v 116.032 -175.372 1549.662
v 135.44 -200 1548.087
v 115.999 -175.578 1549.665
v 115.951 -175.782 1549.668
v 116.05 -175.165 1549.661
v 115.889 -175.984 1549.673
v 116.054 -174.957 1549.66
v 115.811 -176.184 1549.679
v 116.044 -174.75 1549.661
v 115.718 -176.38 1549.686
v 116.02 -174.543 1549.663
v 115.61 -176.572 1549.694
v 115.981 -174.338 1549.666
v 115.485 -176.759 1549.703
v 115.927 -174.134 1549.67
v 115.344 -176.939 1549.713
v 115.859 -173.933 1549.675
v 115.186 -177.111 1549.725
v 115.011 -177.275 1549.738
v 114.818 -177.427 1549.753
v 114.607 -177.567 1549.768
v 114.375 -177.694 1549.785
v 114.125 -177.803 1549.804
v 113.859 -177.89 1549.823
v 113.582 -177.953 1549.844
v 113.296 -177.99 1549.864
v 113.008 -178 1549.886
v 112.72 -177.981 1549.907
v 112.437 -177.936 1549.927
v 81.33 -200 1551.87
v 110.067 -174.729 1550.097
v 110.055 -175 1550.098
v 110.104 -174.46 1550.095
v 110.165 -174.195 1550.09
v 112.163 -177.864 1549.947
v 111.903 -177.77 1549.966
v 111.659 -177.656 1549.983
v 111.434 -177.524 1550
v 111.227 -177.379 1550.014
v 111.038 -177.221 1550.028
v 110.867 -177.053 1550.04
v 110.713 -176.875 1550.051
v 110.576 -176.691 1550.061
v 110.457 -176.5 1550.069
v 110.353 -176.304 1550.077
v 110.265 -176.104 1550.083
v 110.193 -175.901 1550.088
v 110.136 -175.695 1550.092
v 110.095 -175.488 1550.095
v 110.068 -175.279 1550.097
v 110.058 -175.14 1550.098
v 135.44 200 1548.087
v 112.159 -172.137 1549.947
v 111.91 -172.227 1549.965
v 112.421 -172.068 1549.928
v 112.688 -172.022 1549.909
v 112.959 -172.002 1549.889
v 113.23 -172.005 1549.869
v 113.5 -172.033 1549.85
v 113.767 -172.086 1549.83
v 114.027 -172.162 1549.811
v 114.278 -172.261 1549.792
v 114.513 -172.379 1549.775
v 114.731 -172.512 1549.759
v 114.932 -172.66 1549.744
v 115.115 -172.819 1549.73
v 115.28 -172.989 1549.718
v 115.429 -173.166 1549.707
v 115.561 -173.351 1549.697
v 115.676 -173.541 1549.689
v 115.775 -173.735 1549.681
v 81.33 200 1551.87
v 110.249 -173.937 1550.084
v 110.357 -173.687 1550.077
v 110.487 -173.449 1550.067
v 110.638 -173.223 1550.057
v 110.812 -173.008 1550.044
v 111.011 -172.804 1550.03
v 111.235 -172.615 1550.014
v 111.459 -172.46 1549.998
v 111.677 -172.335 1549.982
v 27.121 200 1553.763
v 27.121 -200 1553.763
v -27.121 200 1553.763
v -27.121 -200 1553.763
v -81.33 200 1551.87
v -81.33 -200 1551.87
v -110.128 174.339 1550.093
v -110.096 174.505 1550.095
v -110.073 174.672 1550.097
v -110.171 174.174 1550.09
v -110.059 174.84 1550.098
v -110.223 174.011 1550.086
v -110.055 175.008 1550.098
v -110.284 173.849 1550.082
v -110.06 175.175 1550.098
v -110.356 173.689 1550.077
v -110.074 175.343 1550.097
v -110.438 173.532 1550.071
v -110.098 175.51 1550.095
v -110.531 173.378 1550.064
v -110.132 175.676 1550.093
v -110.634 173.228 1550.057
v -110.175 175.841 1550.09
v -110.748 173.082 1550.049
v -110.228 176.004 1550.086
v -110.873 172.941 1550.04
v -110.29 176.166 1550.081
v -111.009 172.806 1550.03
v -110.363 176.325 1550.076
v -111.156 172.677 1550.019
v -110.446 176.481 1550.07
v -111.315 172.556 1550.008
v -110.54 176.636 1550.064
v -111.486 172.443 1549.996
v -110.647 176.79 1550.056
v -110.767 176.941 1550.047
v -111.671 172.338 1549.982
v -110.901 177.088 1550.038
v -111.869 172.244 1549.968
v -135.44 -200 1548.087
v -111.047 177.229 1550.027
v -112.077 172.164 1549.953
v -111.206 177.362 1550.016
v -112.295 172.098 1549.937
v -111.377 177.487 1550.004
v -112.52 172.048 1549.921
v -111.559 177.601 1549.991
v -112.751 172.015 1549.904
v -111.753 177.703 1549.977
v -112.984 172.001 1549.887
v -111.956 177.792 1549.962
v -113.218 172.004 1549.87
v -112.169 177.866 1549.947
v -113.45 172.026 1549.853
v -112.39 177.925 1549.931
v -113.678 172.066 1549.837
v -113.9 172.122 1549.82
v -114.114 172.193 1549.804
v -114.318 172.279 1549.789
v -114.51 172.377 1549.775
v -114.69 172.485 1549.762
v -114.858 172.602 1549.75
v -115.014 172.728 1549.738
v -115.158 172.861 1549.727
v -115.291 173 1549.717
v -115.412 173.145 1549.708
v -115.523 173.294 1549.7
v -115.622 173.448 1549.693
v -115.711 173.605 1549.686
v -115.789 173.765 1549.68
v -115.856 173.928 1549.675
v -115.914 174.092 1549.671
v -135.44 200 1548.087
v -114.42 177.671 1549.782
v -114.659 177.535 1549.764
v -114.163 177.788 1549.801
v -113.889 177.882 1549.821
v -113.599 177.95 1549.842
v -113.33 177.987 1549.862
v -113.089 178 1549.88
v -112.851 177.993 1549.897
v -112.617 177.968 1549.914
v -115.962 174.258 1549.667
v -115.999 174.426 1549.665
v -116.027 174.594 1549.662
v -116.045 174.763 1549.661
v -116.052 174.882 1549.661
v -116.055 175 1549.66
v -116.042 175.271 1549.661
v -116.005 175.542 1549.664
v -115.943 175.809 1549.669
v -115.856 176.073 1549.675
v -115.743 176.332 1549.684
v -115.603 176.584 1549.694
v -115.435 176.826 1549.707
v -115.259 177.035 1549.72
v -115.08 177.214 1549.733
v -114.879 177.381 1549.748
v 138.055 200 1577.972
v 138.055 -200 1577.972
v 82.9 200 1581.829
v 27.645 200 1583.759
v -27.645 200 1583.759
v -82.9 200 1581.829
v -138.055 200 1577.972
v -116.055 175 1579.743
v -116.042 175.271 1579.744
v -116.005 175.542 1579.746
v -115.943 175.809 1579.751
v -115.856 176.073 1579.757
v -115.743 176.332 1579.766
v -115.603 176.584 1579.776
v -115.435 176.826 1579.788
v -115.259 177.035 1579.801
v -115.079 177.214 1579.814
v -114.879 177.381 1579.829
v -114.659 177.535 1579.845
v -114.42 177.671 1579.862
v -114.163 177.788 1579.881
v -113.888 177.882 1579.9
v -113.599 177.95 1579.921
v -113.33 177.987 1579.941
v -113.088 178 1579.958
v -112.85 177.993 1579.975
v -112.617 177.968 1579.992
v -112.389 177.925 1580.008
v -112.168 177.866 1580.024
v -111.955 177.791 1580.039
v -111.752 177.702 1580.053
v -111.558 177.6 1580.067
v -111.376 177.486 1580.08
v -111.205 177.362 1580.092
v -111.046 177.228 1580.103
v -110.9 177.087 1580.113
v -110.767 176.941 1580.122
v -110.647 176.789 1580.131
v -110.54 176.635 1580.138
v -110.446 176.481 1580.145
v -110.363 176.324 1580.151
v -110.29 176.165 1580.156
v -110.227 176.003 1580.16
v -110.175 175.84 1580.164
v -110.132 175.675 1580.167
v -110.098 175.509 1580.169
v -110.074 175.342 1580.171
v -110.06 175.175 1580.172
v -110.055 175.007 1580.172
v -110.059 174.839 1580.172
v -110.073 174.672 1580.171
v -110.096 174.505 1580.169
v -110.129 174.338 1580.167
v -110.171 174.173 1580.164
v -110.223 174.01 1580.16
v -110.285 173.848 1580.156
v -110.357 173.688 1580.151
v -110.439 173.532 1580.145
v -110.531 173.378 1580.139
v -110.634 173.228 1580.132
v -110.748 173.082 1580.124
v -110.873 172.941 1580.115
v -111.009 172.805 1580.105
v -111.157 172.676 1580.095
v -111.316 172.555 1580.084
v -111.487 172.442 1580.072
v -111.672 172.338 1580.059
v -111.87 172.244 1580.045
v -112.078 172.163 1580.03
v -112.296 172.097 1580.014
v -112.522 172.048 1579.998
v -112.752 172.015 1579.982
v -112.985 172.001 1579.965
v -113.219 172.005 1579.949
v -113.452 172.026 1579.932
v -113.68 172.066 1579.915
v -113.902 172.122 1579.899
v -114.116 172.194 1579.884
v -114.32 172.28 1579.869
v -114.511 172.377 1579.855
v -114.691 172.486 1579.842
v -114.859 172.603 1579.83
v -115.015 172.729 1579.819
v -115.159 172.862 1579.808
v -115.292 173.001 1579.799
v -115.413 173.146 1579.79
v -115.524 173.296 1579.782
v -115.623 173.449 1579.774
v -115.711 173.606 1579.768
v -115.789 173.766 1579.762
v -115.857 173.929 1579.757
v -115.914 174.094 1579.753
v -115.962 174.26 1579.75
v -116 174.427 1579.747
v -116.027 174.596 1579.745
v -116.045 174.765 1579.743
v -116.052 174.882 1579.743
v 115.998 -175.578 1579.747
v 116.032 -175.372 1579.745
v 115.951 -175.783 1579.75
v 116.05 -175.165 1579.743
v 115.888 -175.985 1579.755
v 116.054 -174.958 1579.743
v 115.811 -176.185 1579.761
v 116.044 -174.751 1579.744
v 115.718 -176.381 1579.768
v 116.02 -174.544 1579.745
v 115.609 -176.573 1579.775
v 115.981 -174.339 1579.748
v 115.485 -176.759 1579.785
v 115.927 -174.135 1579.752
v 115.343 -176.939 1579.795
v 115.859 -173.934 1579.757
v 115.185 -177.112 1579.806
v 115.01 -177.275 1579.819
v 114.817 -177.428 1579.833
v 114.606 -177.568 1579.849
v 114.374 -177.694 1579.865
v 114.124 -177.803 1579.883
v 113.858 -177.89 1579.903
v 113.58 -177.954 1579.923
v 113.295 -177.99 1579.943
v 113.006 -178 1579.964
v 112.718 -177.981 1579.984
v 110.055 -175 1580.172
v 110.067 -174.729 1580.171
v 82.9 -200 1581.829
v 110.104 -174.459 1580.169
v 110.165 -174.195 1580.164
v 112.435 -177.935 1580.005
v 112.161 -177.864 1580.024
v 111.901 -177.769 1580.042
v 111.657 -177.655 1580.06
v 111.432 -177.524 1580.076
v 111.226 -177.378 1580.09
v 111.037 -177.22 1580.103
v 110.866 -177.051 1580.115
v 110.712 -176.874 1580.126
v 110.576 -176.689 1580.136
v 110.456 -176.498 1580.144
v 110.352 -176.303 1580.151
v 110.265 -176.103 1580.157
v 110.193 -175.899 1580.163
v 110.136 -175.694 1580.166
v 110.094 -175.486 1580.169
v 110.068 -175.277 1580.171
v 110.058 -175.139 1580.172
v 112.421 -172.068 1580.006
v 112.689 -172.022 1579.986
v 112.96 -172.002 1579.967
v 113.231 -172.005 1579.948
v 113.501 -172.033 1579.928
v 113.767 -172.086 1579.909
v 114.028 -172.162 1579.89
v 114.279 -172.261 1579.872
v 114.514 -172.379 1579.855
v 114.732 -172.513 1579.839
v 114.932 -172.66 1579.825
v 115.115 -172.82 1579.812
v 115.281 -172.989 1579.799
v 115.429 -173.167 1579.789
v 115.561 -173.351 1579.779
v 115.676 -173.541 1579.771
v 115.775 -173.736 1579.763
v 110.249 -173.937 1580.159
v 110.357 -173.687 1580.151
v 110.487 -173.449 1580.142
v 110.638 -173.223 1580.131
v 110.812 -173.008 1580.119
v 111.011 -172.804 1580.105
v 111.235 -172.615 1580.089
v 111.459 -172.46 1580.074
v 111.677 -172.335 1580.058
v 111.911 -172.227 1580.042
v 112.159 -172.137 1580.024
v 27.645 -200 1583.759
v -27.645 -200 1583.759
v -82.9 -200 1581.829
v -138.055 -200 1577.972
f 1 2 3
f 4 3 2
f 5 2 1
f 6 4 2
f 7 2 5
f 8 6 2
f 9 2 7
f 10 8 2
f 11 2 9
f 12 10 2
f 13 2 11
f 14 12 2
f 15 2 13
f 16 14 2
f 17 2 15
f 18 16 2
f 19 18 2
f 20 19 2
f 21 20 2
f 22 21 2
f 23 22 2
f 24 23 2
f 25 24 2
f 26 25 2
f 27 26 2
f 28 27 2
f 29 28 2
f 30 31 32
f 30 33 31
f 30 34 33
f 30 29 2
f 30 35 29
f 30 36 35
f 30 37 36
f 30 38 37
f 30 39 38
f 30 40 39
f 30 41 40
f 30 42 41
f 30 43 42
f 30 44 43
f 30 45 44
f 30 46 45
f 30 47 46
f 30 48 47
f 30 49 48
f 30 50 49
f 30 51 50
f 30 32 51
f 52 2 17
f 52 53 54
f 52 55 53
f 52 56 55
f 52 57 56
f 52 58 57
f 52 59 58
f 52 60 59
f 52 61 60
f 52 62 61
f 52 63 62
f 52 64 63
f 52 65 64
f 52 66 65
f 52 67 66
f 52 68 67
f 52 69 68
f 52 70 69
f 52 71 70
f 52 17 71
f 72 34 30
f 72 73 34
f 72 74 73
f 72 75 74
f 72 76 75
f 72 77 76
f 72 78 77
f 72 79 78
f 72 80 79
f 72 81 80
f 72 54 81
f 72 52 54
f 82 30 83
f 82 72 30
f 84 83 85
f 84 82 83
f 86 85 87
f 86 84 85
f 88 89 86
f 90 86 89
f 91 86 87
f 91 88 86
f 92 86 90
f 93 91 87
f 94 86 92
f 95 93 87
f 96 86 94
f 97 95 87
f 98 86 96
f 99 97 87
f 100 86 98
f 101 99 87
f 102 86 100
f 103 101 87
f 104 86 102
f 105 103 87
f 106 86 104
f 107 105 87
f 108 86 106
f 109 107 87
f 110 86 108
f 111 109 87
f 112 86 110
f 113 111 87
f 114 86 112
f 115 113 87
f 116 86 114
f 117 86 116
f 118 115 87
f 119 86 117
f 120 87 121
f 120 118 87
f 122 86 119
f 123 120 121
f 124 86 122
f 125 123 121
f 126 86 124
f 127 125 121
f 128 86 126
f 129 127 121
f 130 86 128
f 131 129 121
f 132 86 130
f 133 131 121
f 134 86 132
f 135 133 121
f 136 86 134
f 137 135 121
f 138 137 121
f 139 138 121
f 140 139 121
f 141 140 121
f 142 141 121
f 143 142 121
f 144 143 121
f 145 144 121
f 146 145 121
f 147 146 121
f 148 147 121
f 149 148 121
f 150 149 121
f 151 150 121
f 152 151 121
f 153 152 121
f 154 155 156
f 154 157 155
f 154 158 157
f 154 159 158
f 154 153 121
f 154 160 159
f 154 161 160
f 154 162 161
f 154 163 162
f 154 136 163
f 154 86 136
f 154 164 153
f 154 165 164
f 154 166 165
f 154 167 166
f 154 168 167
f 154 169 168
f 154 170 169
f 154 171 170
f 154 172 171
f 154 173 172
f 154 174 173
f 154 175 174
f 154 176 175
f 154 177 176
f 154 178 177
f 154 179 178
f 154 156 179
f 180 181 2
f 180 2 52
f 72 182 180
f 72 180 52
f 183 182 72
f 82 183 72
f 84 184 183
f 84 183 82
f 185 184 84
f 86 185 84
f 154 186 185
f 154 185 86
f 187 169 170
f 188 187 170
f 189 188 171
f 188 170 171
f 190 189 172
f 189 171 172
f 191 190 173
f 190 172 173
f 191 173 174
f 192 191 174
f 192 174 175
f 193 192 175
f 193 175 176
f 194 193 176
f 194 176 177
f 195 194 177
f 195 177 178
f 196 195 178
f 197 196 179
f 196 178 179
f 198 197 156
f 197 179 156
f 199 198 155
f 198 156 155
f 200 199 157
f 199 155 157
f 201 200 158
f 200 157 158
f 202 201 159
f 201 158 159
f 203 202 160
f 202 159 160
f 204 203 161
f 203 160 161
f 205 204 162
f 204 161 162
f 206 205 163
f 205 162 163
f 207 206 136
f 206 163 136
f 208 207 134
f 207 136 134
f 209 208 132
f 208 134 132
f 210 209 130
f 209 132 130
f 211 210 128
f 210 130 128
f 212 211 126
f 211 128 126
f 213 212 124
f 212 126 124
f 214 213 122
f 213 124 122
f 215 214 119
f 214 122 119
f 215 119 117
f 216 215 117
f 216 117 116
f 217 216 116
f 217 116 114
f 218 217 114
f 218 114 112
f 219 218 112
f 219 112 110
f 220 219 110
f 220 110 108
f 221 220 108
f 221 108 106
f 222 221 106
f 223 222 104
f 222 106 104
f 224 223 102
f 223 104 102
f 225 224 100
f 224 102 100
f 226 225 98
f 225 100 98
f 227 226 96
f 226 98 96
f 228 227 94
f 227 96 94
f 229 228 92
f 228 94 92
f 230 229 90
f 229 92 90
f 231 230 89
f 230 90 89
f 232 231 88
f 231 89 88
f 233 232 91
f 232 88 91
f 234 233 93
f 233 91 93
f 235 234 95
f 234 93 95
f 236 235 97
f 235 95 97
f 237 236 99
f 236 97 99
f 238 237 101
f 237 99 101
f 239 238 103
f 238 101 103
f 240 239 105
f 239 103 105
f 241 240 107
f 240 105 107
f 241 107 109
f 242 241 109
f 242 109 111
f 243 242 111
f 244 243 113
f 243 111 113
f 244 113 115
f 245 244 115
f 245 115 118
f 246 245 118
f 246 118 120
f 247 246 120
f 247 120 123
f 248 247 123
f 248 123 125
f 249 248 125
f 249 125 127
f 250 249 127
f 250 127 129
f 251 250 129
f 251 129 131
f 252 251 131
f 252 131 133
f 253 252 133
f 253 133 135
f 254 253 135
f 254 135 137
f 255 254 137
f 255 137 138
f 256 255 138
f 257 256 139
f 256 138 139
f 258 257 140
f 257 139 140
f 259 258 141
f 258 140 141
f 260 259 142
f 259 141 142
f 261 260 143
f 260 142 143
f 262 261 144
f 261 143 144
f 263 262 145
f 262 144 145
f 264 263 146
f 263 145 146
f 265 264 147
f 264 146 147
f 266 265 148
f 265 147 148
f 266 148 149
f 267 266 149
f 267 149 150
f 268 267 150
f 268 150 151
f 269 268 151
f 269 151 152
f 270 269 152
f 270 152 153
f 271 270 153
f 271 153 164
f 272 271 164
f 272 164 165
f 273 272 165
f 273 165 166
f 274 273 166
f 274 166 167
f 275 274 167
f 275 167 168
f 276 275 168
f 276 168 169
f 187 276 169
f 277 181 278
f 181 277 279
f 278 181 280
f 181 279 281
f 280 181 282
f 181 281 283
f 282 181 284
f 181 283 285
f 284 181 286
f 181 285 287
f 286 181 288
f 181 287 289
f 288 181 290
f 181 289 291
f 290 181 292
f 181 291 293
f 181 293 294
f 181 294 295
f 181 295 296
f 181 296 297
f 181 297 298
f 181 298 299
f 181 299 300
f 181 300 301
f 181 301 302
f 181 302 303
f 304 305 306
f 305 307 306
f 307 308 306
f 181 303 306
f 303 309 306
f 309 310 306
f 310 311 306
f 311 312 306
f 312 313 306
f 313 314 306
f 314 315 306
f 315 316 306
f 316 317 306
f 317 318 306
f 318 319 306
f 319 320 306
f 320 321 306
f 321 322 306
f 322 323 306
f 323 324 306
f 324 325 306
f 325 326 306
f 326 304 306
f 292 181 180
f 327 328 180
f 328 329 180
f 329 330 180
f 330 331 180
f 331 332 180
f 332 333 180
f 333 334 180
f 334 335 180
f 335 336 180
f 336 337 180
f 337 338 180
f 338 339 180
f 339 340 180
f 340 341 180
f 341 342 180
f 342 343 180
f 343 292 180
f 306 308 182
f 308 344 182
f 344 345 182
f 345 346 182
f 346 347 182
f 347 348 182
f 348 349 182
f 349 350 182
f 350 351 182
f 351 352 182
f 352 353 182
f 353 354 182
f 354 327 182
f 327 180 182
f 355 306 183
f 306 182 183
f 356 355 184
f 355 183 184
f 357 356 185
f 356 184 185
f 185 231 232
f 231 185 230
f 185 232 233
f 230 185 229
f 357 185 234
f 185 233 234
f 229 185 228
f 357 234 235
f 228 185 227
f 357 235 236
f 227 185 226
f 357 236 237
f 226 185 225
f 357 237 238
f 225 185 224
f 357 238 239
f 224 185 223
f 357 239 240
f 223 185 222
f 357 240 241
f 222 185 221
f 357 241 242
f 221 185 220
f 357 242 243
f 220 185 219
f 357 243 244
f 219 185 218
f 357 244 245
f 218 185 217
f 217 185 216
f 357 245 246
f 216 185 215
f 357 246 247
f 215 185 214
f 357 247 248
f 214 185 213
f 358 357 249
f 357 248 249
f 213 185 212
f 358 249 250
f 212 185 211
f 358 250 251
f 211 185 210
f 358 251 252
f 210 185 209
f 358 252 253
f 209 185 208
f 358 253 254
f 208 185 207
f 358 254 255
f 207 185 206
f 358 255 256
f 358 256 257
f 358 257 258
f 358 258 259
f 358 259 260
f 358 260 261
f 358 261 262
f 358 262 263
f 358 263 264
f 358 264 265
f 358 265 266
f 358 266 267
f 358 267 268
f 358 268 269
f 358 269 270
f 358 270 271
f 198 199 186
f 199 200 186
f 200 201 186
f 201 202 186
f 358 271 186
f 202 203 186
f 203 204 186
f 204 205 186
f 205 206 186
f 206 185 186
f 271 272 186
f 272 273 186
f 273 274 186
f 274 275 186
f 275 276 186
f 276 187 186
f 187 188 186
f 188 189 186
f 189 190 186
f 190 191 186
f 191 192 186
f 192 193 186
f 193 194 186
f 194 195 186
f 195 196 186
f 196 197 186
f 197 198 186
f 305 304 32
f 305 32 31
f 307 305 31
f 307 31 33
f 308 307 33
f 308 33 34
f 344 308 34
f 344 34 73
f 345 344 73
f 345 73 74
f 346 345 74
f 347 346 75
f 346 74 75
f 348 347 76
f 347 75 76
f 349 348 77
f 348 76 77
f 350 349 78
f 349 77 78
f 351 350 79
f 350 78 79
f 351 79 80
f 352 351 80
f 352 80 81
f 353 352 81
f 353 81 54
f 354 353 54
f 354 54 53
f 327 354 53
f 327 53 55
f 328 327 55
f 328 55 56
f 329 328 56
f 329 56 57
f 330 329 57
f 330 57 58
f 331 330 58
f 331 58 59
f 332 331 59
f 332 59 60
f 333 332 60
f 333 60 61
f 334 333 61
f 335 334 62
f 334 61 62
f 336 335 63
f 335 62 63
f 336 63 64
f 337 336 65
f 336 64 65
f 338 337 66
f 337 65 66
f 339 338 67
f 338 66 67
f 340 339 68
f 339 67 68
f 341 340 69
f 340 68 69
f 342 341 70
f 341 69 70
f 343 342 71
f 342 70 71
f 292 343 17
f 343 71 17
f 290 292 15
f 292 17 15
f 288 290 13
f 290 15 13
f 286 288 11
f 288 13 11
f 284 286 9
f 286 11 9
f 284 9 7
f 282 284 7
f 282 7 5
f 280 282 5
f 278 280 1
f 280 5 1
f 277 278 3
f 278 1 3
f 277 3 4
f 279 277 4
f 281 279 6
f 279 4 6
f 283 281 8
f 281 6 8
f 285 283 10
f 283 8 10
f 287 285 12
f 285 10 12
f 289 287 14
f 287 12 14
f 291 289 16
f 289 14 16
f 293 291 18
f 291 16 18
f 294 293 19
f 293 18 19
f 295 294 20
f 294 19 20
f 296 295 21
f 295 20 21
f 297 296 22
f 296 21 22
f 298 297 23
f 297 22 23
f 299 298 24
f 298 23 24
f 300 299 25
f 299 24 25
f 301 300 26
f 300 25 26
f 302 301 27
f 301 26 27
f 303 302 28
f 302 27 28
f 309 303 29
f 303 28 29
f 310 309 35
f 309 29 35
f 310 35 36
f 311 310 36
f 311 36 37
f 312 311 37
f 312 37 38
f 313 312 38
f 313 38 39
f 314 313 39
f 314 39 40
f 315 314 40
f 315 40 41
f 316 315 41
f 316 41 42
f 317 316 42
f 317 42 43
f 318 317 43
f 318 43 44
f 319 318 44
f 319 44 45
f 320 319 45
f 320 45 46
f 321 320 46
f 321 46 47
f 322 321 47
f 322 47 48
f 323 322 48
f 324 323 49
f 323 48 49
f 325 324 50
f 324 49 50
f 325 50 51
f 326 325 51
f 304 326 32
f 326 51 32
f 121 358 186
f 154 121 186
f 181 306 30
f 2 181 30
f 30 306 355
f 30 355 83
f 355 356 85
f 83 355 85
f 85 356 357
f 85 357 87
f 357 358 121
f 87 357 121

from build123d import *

# Parameters (mm, degrees)
F0_W     = 400
F0_H     = 30
F1_ANGLE = 10
F4_D     = 6
F4_DEPTH = 100


with BuildPart() as f1:
    # F0 (on Right) → F1 (revolve, symmetric)
    with BuildSketch(Plane.YZ) as f1_sk:
        with Locations((0, 1569)):
            Rectangle(F0_W, F0_H)
    revolve(axis=Axis((0, -0.207613, 0), (0, 1, 0)), revolution_arc=F1_ANGLE / 2)
    revolve(f1_sk.sketch, axis=Axis((0, -0.207613, 0), (0, -1, 0)), revolution_arc=F1_ANGLE / 2)

    # F4
    with Locations(Plane.XY.offset(1600)):
        with Locations((-113.054697, 175), (113.054697, -175)):
            Hole(F4_D / 2, depth=F4_DEPTH)


solid = f1.part
